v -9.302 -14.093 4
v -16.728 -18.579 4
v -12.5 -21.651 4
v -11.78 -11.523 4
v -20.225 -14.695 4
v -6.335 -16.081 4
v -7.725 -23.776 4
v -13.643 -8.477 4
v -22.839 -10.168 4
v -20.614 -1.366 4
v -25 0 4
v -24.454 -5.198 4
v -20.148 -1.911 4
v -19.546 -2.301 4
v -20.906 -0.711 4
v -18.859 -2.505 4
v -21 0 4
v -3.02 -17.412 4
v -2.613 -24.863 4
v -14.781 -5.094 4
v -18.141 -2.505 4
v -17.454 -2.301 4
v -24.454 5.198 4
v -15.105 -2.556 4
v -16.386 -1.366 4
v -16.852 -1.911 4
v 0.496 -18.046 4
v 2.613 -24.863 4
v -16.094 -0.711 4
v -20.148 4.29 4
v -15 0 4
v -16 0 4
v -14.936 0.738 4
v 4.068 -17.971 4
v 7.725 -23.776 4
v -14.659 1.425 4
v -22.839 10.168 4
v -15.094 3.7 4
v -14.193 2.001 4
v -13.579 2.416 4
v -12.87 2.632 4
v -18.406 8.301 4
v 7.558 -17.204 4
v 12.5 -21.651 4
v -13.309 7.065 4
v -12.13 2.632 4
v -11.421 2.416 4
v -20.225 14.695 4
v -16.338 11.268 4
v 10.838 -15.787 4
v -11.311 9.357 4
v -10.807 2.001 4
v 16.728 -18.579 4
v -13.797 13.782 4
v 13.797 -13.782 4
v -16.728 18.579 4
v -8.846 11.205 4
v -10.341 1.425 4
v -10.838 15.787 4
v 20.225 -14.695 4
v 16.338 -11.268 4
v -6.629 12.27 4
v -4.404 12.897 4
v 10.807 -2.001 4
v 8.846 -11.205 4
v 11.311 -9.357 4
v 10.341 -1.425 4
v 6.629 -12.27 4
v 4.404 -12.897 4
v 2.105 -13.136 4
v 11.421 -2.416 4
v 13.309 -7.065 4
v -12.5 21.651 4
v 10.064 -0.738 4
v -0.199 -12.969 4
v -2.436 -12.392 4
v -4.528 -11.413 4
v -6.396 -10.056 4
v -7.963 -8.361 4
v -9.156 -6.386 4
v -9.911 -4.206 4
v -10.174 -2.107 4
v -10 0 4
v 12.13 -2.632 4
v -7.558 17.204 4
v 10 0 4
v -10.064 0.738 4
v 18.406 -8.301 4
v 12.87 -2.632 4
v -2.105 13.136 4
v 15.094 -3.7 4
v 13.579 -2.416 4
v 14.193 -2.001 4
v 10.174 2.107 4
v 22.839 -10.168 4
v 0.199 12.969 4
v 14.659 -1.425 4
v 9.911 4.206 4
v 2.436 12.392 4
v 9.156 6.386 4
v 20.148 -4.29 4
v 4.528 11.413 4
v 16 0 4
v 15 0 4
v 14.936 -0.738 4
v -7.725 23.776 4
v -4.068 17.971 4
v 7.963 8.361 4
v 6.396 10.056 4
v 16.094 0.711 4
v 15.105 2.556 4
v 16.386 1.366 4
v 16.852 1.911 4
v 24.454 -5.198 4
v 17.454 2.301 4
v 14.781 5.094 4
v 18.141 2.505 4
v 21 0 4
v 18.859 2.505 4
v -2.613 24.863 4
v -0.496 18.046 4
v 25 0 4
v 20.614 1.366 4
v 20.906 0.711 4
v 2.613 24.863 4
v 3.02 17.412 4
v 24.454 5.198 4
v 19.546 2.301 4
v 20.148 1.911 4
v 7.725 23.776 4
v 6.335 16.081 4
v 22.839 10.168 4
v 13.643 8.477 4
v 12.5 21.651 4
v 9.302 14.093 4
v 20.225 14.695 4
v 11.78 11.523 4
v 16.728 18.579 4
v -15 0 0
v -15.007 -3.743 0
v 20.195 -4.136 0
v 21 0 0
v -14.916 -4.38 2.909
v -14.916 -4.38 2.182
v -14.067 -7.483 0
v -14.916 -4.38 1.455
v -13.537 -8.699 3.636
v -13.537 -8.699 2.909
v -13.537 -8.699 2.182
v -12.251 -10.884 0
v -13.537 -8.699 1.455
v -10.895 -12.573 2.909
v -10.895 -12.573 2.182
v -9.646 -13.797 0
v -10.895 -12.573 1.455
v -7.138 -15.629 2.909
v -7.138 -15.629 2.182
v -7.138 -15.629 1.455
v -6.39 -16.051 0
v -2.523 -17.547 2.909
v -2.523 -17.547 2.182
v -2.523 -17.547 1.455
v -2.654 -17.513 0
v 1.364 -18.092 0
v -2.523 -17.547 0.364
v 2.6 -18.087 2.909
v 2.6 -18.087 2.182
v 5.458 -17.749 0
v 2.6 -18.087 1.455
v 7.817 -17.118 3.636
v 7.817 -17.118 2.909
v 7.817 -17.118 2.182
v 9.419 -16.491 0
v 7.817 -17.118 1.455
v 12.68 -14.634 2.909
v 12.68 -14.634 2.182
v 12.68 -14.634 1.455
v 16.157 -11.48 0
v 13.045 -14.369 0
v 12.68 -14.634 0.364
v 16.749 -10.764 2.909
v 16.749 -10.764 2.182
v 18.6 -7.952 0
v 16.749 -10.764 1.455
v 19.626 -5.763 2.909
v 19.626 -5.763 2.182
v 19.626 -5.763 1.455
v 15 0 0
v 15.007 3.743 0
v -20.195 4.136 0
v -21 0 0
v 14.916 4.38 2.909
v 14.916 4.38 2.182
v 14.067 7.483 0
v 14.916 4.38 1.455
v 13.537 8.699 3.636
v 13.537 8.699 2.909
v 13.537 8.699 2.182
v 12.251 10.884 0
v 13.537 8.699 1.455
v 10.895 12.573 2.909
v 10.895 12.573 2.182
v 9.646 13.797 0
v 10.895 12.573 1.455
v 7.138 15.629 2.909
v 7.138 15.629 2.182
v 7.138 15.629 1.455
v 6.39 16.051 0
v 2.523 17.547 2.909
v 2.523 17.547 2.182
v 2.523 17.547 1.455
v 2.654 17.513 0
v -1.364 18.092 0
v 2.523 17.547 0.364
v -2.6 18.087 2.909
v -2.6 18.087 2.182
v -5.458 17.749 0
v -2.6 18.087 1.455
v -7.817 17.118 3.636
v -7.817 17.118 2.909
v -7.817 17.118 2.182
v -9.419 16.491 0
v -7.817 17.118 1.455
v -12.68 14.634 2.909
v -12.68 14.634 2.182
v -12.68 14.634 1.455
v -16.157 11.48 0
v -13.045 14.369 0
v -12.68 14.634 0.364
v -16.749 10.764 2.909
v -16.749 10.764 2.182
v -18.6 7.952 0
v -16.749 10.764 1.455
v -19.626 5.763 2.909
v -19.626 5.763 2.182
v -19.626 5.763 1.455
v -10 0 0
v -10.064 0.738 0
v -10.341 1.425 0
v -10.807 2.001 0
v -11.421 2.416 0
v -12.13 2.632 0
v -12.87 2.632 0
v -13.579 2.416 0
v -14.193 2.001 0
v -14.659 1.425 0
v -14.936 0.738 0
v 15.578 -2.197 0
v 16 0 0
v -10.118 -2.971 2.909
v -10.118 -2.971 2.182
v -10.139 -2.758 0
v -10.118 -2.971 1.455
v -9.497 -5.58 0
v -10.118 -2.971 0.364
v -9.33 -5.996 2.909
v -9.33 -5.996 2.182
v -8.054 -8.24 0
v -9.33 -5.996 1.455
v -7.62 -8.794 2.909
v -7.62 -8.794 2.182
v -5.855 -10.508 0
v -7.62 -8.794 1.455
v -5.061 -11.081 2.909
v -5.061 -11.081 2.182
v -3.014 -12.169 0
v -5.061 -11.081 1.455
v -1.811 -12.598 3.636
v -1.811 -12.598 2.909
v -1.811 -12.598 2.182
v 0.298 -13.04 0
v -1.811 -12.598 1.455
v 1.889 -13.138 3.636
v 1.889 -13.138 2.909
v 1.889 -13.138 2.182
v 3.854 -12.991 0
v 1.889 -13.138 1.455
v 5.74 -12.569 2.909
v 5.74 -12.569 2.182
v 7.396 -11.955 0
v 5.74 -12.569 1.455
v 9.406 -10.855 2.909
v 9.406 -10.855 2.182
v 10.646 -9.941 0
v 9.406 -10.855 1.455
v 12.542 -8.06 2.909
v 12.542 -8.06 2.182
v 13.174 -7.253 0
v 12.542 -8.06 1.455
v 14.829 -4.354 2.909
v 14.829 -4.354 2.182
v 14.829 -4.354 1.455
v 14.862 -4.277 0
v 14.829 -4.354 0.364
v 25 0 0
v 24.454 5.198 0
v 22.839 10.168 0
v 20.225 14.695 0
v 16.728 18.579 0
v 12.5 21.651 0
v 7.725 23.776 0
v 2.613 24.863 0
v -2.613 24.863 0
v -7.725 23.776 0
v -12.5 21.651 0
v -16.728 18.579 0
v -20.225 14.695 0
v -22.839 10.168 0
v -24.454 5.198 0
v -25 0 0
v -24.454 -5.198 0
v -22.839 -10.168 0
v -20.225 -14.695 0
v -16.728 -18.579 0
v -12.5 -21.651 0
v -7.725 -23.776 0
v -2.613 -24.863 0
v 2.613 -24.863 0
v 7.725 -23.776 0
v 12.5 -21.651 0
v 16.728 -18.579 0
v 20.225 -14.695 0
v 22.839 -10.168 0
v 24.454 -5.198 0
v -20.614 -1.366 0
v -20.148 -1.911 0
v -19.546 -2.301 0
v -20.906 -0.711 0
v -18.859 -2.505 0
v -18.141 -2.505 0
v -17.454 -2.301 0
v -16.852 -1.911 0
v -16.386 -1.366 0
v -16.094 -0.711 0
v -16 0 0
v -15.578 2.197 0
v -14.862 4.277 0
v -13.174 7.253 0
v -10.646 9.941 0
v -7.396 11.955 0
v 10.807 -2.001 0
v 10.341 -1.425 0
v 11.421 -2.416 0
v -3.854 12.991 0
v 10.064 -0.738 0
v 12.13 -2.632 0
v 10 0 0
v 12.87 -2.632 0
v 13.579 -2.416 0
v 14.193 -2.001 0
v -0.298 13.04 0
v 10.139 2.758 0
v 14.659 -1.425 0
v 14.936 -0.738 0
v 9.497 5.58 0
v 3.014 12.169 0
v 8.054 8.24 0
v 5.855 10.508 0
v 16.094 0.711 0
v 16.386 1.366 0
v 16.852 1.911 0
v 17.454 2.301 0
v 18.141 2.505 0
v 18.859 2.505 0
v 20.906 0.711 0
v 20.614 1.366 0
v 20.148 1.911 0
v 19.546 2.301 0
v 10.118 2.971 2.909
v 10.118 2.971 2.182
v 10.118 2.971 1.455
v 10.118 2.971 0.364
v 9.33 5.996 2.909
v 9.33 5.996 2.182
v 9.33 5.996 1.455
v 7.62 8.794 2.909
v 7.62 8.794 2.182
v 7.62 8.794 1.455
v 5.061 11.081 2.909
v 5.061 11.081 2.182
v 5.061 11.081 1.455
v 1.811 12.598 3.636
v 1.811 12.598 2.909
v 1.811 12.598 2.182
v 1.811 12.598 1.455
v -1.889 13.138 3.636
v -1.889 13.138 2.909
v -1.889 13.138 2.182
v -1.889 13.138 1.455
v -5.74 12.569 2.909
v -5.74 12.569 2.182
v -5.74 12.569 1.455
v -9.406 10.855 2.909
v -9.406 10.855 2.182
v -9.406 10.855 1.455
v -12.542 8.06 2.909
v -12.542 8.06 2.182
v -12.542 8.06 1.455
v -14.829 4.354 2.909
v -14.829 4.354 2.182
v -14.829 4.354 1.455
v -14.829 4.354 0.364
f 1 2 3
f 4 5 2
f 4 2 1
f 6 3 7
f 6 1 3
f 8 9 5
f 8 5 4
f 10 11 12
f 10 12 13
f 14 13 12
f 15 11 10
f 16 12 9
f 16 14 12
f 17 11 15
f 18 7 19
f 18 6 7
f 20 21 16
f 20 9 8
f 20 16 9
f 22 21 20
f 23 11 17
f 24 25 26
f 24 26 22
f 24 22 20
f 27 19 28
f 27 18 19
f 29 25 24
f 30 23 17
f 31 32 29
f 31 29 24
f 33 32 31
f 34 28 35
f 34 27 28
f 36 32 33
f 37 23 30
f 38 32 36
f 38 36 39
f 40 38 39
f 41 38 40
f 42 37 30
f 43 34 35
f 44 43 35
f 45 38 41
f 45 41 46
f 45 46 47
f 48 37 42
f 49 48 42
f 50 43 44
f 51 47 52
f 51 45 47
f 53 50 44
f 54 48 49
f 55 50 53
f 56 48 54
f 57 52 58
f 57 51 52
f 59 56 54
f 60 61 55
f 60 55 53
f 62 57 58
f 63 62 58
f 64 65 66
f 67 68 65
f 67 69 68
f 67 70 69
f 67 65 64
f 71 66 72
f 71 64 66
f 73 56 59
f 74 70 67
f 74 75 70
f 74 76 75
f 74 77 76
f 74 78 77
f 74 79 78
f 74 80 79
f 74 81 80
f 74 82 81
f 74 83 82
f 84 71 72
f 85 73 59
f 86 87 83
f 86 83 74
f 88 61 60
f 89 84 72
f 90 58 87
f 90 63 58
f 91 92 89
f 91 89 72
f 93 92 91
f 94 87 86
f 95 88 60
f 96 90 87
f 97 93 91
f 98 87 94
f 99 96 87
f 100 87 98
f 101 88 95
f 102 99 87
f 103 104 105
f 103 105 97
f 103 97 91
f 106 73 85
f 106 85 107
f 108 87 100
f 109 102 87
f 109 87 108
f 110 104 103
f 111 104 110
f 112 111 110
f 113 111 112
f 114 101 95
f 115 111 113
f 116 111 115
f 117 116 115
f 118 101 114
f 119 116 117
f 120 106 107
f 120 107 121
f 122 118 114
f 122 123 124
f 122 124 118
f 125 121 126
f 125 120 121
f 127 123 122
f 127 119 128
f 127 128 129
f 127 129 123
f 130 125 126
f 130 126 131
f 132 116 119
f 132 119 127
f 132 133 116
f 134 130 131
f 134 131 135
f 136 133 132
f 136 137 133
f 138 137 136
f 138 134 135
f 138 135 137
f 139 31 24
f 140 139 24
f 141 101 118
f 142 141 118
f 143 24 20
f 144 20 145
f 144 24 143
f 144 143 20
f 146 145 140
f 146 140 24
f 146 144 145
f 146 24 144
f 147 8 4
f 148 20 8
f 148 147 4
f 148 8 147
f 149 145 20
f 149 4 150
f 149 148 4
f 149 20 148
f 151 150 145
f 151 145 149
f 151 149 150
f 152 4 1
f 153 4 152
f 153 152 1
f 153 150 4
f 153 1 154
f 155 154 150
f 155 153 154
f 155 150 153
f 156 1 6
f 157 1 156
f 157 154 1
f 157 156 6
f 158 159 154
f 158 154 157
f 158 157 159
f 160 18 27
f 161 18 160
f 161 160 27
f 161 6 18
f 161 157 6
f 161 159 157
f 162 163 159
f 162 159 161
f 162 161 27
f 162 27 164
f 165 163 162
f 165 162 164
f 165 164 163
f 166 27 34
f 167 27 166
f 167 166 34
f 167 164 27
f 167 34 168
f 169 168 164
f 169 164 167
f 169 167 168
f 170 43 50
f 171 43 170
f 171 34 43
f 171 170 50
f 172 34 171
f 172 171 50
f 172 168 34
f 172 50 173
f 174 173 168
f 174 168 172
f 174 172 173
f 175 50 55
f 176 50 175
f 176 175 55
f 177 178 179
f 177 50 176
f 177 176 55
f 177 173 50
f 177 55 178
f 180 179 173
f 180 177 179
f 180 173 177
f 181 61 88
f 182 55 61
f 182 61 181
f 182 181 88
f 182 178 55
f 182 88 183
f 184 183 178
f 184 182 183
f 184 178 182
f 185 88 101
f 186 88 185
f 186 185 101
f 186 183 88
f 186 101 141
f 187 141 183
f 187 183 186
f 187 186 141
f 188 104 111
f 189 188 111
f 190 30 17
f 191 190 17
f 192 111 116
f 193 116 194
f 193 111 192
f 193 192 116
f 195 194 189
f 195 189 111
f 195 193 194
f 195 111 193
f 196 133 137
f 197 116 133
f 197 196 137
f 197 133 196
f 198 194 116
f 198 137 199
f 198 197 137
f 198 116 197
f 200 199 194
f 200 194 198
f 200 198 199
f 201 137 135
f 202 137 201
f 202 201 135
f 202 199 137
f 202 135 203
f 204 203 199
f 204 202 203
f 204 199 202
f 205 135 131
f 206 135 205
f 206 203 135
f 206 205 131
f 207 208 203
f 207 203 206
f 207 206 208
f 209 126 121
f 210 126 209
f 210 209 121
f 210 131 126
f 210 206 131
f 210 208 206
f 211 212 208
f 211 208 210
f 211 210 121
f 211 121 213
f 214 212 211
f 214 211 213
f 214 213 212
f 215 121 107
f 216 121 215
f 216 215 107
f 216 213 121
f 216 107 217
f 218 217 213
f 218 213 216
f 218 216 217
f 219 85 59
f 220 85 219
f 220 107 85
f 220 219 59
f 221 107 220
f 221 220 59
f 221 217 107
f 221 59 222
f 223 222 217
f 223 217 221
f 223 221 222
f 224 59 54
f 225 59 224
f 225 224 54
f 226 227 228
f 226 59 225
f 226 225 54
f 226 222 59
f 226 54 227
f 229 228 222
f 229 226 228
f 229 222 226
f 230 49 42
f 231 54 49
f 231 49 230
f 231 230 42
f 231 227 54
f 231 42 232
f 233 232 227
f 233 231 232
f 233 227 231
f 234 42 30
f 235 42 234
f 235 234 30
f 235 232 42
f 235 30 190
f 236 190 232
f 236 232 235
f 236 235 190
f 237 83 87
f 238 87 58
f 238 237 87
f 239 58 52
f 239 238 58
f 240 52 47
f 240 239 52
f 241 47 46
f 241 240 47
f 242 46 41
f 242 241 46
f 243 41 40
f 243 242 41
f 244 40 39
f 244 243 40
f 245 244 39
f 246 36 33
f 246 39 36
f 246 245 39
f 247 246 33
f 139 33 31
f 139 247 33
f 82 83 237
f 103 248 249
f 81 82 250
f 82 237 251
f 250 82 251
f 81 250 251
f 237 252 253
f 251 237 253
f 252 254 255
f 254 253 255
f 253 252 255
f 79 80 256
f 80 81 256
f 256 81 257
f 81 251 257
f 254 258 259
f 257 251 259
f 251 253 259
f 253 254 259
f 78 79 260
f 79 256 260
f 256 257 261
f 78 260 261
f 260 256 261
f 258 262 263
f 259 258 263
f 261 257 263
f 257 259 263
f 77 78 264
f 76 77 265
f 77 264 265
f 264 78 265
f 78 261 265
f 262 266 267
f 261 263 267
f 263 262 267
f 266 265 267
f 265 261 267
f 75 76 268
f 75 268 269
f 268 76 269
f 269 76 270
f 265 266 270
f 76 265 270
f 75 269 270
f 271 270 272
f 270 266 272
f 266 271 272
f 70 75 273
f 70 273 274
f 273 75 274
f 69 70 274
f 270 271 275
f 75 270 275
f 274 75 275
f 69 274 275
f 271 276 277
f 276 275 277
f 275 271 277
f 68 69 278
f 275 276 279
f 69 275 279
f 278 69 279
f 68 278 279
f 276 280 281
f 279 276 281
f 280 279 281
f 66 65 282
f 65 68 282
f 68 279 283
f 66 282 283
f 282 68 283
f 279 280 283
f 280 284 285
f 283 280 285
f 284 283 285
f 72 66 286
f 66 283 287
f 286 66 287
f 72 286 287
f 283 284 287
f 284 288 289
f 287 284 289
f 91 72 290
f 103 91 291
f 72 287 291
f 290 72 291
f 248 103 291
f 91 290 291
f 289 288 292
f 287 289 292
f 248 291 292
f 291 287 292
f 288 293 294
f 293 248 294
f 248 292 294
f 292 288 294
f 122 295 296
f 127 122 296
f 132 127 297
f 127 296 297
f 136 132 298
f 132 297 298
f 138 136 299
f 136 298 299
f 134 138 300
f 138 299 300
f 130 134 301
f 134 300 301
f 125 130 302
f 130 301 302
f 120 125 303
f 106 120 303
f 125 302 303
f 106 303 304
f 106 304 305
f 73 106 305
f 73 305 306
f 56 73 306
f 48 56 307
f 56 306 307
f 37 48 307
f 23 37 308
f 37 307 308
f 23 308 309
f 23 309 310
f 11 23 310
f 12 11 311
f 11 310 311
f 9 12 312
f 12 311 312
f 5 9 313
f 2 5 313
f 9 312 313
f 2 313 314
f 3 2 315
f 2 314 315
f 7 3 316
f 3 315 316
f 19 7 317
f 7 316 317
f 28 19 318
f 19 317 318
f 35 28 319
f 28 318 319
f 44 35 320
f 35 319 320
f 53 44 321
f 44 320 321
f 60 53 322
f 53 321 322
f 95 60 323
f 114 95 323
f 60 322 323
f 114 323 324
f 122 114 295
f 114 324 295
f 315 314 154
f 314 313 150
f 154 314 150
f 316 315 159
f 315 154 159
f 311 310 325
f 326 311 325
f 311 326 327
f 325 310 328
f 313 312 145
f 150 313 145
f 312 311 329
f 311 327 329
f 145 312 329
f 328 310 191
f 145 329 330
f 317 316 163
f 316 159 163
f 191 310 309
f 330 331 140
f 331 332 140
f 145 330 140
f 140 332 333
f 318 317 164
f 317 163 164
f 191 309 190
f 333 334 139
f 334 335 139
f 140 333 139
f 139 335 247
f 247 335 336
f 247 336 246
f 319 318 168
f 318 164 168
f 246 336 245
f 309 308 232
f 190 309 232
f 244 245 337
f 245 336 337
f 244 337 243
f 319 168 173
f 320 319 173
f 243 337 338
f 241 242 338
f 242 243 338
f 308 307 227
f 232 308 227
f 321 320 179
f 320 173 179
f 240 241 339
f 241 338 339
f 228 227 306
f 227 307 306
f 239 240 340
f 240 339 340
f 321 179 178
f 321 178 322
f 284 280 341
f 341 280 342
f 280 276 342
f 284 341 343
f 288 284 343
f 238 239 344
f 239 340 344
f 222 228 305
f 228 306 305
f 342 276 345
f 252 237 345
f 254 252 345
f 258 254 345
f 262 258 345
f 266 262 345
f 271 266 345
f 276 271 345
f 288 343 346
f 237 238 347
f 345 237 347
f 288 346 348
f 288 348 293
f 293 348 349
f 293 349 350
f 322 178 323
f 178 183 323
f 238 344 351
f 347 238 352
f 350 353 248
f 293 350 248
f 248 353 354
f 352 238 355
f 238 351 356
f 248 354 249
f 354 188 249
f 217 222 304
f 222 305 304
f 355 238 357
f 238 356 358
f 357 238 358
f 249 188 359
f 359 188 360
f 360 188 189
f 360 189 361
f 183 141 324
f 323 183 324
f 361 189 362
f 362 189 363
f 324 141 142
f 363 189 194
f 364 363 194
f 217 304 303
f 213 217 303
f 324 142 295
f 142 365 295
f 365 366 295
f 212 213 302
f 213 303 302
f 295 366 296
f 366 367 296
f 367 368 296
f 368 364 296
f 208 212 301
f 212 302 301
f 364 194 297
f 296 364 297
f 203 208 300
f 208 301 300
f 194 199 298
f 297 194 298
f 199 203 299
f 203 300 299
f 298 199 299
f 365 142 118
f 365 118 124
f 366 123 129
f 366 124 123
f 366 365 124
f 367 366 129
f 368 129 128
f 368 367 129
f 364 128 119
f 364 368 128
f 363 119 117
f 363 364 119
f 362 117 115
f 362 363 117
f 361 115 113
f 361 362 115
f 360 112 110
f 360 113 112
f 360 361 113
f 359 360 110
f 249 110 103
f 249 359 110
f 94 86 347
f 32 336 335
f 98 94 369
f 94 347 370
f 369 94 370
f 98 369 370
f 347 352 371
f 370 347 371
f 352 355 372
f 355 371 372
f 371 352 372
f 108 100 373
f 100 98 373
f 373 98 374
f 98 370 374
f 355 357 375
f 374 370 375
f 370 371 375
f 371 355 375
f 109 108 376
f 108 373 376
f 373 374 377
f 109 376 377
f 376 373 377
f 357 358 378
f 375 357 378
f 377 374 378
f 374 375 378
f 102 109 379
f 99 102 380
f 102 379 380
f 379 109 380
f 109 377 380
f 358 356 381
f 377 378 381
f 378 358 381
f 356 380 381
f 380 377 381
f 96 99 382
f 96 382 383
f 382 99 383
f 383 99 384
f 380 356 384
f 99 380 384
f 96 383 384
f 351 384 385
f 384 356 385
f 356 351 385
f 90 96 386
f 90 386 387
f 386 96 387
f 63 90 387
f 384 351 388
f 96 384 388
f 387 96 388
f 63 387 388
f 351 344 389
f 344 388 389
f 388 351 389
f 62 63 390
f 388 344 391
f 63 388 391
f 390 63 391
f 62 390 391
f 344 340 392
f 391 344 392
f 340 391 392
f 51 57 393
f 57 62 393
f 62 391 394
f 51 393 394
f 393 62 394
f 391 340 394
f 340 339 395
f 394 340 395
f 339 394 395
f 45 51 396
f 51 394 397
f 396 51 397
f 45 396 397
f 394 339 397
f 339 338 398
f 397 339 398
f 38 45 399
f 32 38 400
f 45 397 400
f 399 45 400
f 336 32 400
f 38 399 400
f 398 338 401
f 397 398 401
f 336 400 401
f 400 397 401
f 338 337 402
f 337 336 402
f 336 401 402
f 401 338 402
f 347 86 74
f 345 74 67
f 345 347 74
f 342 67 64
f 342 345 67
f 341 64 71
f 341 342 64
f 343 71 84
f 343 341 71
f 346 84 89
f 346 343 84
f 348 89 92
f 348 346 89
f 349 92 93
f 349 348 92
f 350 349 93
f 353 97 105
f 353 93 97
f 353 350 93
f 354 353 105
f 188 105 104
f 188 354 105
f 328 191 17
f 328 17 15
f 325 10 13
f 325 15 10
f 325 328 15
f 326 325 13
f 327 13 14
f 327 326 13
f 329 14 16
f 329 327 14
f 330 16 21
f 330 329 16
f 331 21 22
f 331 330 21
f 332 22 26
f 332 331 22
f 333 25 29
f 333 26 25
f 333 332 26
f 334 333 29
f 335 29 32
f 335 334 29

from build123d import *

# Parameters (mm, degrees)
SKETCH_R        = 25
PAD_DEPTH       = 4
POCKET_DEPTH    = 5
POCKET001_DEPTH = 5


with BuildPart() as part:
    # Sketch → Pad (new body)
    with BuildSketch(Plane.XY):
        Circle(SKETCH_R)
    extrude(amount=PAD_DEPTH)

    # Sketch006 → Pocket (cut)
    with BuildSketch(Plane(origin=(0, 0, 0), x_dir=(-1, 0, 0), z_dir=(0, 0, 1))):
        with BuildLine():
            ThreePointArc((10, 0), (12.5, -2.660022), (15, 0))
            add(Edge.make_bspline(
                [(15, 0), (15.545455, 4.28399), (14.745053, 8.910699), (12.419355, 13.410338), (8.573372, 17.219141), (3.449426, 19.762244), (-2.463902, 20.569387), (-8.48908, 19.39714), (-13.890489, 16.306895), (-18.024894, 11.652452), (-20.454545, 5.997586), (-21, 0)],
                knots=[0, 0, 0, 0, 0, 0, 0, 0, 0, 0, 0, 0, 3.296908, 3.296908, 3.296908, 3.296908, 3.296908, 3.296908, 3.296908, 3.296908, 3.296908, 3.296908, 3.296908, 3.296908], degree=11))
            ThreePointArc((-21, 0), (-18.5, -2.530386), (-16, 0))
            add(Edge.make_bspline(
                [(10, 0), (10.545455, 2.855993), (10.193672, 6.054706), (8.76521, 9.282944), (6.203587, 12.133546), (2.628131, 14.160628), (-1.642606, 14.967771), (-6.119295, 14.311546), (-10.236344, 12.179501), (-13.473513, 8.796459), (-15.454545, 4.569589), (-16, 0)],
                knots=[0, 0, 0, 0, 0, 0, 0, 0, 0, 0, 0, 0, 3.296908, 3.296908, 3.296908, 3.296908, 3.296908, 3.296908, 3.296908, 3.296908, 3.296908, 3.296908, 3.296908, 3.296908], degree=11))
        make_face()
    extrude(amount=POCKET_DEPTH, mode=Mode.SUBTRACT)

    # Sketch007 → Pocket001 (cut)
    with BuildSketch(Plane.XY):
        with BuildLine():
            ThreePointArc((10, 0), (12.5, -2.660022), (15, 0))
            add(Edge.make_bspline(
                [(15, 0), (15.545455, 4.28399), (14.745053, 8.910699), (12.419355, 13.410338), (8.573372, 17.219141), (3.449426, 19.762244), (-2.463902, 20.569387), (-8.48908, 19.39714), (-13.890489, 16.306895), (-18.024894, 11.652452), (-20.454545, 5.997586), (-21, 0)],
                knots=[0, 0, 0, 0, 0, 0, 0, 0, 0, 0, 0, 0, 3.296908, 3.296908, 3.296908, 3.296908, 3.296908, 3.296908, 3.296908, 3.296908, 3.296908, 3.296908, 3.296908, 3.296908], degree=11))
            ThreePointArc((-21, 0), (-18.5, -2.530386), (-16, 0))
            add(Edge.make_bspline(
                [(10, 0), (10.545455, 2.855993), (10.193672, 6.054706), (8.76521, 9.282944), (6.203587, 12.133546), (2.628131, 14.160628), (-1.642606, 14.967771), (-6.119295, 14.311546), (-10.236344, 12.179501), (-13.473513, 8.796459), (-15.454545, 4.569589), (-16, 0)],
                knots=[0, 0, 0, 0, 0, 0, 0, 0, 0, 0, 0, 0, 3.296908, 3.296908, 3.296908, 3.296908, 3.296908, 3.296908, 3.296908, 3.296908, 3.296908, 3.296908, 3.296908, 3.296908], degree=11))
        make_face()
    extrude(amount=POCKET001_DEPTH, mode=Mode.SUBTRACT)


solid = part.part
